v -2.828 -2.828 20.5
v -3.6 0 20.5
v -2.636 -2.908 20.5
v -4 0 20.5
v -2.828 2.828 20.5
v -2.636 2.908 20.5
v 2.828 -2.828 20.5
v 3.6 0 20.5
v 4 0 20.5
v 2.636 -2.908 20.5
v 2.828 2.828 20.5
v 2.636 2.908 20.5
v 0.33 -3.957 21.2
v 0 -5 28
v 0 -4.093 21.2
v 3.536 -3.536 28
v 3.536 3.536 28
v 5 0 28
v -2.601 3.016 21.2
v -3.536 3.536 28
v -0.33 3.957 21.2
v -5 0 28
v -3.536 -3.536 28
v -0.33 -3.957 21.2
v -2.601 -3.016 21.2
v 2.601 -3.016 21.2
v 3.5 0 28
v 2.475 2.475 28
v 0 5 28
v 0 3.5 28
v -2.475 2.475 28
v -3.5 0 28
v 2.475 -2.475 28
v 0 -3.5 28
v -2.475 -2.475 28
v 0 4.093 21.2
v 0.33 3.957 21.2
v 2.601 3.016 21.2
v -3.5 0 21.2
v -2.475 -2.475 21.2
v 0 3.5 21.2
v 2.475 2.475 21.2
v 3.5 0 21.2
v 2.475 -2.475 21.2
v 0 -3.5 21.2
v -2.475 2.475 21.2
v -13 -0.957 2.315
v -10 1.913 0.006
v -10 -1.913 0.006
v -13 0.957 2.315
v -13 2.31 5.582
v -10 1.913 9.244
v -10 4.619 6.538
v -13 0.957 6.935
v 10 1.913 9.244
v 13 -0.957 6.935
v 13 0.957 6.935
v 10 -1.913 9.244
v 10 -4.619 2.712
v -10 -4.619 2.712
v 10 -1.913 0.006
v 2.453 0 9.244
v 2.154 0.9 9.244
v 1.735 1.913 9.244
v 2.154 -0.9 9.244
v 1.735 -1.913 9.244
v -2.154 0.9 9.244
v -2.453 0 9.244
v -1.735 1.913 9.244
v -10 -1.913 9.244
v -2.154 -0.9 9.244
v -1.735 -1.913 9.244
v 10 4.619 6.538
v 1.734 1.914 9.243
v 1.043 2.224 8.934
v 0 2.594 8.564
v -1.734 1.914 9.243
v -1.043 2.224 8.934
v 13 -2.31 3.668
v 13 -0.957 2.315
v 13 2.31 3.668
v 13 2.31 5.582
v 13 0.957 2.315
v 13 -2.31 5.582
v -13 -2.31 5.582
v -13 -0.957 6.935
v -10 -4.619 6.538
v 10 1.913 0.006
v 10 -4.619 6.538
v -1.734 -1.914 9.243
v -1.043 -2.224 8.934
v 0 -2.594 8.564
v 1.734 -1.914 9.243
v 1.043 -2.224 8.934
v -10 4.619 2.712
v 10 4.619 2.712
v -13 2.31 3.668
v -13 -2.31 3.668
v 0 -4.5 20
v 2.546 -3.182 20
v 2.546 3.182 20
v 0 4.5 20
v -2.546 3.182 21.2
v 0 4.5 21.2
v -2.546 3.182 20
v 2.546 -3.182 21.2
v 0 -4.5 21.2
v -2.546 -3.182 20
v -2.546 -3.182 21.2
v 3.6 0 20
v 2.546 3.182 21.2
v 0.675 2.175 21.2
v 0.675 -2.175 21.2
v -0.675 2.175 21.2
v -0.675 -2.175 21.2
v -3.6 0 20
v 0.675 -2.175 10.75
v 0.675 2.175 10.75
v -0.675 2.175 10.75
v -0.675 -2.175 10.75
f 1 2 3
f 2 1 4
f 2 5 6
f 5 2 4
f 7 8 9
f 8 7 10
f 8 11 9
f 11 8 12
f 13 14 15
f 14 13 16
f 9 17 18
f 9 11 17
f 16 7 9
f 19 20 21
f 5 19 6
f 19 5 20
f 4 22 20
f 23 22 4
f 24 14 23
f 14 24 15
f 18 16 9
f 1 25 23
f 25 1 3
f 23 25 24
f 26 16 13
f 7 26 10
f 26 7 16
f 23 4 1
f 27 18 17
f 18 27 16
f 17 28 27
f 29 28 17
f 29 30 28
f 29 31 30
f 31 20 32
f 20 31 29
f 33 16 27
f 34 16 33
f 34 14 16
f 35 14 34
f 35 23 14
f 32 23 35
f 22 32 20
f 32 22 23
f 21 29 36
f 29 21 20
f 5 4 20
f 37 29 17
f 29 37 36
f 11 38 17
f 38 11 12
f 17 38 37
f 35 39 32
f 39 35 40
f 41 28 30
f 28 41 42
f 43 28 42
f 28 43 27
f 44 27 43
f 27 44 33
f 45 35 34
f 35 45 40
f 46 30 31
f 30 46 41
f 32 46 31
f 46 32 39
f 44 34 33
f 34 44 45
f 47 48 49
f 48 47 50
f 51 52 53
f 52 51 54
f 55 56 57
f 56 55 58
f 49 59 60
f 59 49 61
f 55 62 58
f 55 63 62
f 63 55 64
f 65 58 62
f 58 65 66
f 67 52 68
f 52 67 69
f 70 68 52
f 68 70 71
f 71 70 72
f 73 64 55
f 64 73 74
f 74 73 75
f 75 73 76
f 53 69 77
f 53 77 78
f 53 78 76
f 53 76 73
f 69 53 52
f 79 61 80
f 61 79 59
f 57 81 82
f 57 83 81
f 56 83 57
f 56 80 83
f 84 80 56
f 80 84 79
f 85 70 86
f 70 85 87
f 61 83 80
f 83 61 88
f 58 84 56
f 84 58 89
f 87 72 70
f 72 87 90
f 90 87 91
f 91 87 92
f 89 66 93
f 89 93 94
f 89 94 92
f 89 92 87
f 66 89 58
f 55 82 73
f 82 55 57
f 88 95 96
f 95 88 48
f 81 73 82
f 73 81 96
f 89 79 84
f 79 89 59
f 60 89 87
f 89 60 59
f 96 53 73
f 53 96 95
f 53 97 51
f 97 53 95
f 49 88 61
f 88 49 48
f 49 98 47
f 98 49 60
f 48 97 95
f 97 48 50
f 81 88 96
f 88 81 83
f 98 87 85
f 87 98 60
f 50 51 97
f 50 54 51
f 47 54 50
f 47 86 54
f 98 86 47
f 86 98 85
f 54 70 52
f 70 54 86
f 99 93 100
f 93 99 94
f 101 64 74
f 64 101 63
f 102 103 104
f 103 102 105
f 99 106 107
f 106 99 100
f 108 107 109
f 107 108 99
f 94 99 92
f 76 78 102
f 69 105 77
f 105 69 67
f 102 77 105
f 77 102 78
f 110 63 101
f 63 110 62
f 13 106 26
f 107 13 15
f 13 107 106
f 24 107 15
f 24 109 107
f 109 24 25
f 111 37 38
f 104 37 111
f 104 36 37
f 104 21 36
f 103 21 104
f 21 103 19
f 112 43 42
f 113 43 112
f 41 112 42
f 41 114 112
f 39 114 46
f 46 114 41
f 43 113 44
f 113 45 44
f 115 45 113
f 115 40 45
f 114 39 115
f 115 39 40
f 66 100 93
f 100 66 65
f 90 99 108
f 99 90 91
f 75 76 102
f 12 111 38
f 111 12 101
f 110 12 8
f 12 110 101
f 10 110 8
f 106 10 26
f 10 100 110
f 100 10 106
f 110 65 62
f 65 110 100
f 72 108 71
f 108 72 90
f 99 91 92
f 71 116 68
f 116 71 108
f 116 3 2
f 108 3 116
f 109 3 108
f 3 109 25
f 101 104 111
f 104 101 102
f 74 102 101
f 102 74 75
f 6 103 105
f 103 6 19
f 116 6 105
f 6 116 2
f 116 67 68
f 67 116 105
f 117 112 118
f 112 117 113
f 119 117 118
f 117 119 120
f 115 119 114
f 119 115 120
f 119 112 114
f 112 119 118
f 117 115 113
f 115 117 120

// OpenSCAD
$fn = 8;

module horizontal_crossbar(r)
{
	translate(v = [0, 0, 0.925 * r])
		rotate(v = [1, 0, 0], a = 0.5 * 45)
			rotate(v = [0, 1, 0], a = 90) {
				hull() {
					cylinder(r1 = r, r2 = r, h = 20, center = true);	
					cylinder(r1 = 0.5 * r, r2 = 0.5 * r, h = 26, center = true);	
				}
			}
}

module tang_hole()
{
	translate(v = [0, 0, 16])
		cube(size = [1.35, 4.35, 10.5], center = true);
}

module shaft()
{
	difference() {
		hull() {
			translate(v = [0, 0, 5])
				cylinder(r1 = 2, r2 = 2, h = 10);
			translate(v = [0, 0, 20])
				scale(v = [1.2, 1.5, 1.2])
					cylinder(r1 = 3, r2 = 3, h = 1);
		}
	}
}

module shaft_extension()
{
	translate(v = [0, 0, 20.5])
	difference() {
		cylinder(r1 = 4, r2 = 5, h = 7.5);
		translate(v = [0, 0, -1])
			cylinder(r1 = 3.5, r2 = 3.5, h = 10);
	}
}

difference() {
union() {
	horizontal_crossbar(5);
	shaft();
	shaft_extension();
}
tang_hole();
}
